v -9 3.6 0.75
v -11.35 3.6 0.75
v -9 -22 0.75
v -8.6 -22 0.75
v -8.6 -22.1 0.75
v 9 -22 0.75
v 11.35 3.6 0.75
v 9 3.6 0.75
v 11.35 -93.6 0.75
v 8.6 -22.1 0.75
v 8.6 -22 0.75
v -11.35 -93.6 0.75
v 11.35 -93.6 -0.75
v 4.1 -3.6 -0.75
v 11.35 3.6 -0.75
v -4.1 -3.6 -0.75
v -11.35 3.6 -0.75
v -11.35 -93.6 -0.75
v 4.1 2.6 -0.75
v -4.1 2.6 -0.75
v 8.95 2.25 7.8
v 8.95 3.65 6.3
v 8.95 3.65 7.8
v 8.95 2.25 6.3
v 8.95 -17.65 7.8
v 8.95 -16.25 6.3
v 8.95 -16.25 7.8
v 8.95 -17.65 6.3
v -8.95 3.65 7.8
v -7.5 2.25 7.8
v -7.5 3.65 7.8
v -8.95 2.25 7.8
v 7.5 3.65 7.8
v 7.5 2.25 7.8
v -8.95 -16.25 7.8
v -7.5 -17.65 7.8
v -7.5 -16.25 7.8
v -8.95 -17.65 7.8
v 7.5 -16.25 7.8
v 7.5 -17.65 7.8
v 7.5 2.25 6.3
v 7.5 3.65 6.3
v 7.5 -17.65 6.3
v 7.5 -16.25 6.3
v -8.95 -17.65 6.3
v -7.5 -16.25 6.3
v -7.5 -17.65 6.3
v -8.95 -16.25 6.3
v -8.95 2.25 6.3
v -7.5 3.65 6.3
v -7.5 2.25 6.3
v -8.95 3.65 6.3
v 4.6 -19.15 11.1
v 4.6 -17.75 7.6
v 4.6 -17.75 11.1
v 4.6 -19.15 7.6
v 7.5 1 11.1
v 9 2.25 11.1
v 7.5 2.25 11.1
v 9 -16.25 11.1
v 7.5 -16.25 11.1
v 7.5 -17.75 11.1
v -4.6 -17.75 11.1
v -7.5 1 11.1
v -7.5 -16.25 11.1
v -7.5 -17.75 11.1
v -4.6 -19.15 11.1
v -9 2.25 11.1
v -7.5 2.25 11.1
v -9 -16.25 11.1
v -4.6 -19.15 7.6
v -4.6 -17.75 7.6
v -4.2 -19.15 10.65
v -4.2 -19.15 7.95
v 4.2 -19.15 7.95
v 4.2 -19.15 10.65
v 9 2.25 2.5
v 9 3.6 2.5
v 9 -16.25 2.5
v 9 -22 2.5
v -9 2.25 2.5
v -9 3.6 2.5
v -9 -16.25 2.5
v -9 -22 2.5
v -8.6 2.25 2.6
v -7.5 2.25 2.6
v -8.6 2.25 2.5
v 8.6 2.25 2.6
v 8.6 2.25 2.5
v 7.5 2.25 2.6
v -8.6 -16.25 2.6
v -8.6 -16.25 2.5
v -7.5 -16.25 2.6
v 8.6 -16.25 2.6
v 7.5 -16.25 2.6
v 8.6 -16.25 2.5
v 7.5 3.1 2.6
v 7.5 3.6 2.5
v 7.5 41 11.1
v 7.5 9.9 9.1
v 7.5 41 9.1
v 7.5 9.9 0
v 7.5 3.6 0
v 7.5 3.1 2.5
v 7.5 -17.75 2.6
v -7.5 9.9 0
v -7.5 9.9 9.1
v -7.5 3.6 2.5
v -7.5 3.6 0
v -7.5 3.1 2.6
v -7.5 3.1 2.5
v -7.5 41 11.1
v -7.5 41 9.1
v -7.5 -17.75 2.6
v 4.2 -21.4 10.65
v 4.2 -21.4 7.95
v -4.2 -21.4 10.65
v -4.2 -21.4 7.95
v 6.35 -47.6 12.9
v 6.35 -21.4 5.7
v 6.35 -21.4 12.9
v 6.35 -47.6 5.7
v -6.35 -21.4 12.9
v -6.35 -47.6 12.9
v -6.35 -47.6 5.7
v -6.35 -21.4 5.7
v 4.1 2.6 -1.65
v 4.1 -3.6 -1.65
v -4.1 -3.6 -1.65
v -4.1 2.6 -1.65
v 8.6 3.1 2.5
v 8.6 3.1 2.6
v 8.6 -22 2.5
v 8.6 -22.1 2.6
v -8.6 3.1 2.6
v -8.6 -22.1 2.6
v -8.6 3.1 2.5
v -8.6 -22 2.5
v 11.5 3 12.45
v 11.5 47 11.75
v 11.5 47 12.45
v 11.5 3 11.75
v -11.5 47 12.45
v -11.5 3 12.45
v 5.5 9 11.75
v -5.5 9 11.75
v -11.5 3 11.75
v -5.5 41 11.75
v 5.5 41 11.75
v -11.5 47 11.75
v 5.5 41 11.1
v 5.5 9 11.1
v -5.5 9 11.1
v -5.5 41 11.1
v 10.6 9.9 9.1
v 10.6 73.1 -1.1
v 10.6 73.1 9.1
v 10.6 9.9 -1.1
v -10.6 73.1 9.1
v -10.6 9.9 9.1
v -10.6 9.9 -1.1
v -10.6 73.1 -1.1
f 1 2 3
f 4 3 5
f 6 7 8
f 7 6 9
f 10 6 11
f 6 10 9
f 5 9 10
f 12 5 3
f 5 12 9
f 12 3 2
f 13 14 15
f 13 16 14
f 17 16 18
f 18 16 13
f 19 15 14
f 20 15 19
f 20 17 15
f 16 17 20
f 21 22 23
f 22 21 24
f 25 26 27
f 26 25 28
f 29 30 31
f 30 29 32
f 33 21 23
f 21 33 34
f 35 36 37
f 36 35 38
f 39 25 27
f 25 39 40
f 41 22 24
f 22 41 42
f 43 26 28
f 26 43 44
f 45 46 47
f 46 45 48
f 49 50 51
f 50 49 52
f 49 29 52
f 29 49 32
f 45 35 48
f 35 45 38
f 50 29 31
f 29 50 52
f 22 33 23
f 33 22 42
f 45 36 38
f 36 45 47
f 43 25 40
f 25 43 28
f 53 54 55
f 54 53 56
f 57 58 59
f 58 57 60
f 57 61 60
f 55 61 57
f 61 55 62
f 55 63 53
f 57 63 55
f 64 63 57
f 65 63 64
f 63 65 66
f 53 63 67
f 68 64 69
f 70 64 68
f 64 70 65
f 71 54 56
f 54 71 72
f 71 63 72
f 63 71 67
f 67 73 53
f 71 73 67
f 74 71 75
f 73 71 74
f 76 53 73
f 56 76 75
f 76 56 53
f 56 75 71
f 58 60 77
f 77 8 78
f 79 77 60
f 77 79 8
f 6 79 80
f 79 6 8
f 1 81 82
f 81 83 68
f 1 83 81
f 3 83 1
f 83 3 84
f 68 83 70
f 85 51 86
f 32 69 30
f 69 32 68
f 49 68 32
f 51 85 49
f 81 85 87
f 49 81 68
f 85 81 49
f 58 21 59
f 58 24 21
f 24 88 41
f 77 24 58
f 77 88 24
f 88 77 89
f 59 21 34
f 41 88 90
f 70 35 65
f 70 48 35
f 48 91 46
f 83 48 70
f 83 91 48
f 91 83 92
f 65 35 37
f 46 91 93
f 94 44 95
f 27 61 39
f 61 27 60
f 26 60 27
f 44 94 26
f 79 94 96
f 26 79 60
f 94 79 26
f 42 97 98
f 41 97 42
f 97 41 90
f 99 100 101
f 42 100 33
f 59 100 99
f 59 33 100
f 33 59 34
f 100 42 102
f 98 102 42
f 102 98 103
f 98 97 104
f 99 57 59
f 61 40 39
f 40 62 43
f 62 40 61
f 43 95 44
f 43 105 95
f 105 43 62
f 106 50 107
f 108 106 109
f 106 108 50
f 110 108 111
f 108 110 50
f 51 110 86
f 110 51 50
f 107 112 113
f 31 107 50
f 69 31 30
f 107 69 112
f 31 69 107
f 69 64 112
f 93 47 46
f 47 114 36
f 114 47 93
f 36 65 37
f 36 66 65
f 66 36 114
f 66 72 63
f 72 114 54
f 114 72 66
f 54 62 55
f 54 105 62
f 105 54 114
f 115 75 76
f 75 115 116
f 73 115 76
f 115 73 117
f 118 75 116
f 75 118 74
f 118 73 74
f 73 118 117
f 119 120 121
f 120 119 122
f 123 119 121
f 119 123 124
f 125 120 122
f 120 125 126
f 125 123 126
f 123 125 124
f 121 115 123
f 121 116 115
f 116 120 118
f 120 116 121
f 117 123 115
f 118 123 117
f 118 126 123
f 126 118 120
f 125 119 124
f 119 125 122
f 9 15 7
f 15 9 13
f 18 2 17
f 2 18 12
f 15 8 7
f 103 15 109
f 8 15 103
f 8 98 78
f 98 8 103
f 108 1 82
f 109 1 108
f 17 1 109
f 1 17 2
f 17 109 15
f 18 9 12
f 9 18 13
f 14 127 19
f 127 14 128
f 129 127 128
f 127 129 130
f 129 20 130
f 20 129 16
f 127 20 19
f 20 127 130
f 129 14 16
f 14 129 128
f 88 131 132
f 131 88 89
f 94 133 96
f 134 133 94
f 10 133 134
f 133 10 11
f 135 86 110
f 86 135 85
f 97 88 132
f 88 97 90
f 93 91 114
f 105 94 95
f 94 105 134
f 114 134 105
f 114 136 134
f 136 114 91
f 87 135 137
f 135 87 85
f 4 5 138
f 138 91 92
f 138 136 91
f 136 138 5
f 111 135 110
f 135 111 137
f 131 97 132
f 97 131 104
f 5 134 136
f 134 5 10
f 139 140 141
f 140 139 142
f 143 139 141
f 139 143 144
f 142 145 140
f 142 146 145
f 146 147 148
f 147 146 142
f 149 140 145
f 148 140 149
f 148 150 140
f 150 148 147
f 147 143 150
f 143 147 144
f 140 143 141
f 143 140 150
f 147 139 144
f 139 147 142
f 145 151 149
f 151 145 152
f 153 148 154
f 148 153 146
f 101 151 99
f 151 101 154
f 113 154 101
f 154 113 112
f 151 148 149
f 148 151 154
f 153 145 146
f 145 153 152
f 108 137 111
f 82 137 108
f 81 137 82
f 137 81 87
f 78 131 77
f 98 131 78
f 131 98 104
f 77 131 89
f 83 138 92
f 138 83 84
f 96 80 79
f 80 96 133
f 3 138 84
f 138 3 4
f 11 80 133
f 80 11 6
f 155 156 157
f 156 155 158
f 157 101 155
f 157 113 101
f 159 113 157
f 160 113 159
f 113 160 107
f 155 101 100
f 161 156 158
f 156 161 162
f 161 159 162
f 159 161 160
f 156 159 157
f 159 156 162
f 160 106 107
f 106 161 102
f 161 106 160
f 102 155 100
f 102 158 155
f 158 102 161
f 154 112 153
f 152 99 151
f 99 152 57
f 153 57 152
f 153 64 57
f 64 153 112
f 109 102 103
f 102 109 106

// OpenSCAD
// file: sensor.scad
use <MCAD/boxes.scad>

//$fn=100;

// large battery 1200mAh : 63
// small battery  600mAh : 38
module battery(length, tol=0) {
    cube([21+tol,length+tol,10+tol],center=true);
}

function inc(arr,tol) = [arr[0]+tol,arr[1]+tol,arr[2]+tol];
function incA(arr,tol) = [arr[0]+tol[0],arr[1]+tol[1],arr[2]+tol[2]];

module esp32(tol=0) {
    pcb=[17.7,21.1,1.3];
    usb=[9,7.3,3.3];
    chip=[13,14,2.1];
    resistors=[17,18,3.6];

    union() {
      // PCB
      cube(inc(pcb, tol), center=true);    
      // USB
      translate([0,-pcb[1]/2+usb[1]/2-1.5,usb[2]/2+pcb[2]/2])
       cube(inc(usb, tol), center=true);    
      // chips
      translate([0,+3.5,chip[2]/2+pcb[2]/2])
       cube(chip, center=true);
      // place for resistors (voltage and battery cables)
      translate([0,0,-resistors[2]/2-pcb[2]/2])
       cube(inc(resistors, tol), center=true);
      // BLE antenna connector
      translate([0,pcb[1]/2,pcb[2]/2+1.5])
       cube(inc([5,5,3], tol), center=true);


    }
}

module antenna(tol=[0,0,0]) {
    union(){        
     cube(incA([22,42,0.5], tol),center=true);
     translate([0,0,-1])        
      cube(incA([10,30,2], tol),center=true);
    }
}

module sensor(tol=0, do_hole=true) {
    pcb=[22.5,97,1.3];
    union() {
      difference() {
        cube(inc(pcb, tol), center=true);    
        if (do_hole) {
          translate([+pcb[0]/2,pcb[1]/2-20.5,0])
            cylinder(6,r=4/2,center=true);
          translate([-pcb[0]/2,pcb[1]/2-20.5,0])
            cylinder(6,r=4/2,center=true);
        }
      }
      // limit line
      translate([0,pcb[1]/2-31,0])
        cube([pcb[0]-8,1,pcb[2]+0.2],center=true);
      // soudures
      translate([0,pcb[1]/2-4,-pcb[2]/2+0.1])
        cube(inc([8,6,2], tol),center=true);
      // chip
      translate([0,pcb[1]/2-13,1.5])
        cube(inc([17,25,2],tol),center=true);
    }
}


module cable(tol=0) {
   translate([0,-4,0])
     cube(inc([8.2,8,2.5],tol),center=true);// usb
   translate([0,-18.9,0])
     cube(inc([12.5,30-4,7],tol),center=true); // plug
}

module model(batt_length, tol=0) {
  translate([0,-45,0])
    sensor(tol);      
  translate([0,25,12.1]) // -> moved 2mm down to adapt esp change below
    antenna([tol,tol,tol]);    
  translate([0,10+batt_length/2,4]) // -> moved 1mm down to keep place for antenna cable
    battery(batt_length,tol);
  translate([0,0,-1]) { // moved 3mm down from v8.0 since space was 9mm (mesured) between PCBs, and min could be 4mm (mesured) -> 9mm-4mm and keep 2mm for security.
    translate([0,-7,8])
      rotate([0,0,0])
        esp32(tol);
    translate([0,-15.6,10.3])
      cable(tol);
  }
}


batS=38;
batL=63;
model(batS);
// main file
use <sensor.scad>

// ================
// holes
// ================
module hole_ESP() {
   translate([0,0,2]) {
    union(){
     translate([0,-7,3.55])// (v8.1) 3mm down
       rotate([0,0,0]) {
        cube([18,18.5,11.1],center=true); // space for cables + esp32
        cube([15,21.5,11.1],center=true); // only keep 
        translate([0,0,1.5])
         esp32(0.2);
       };
      translate([0,-15.6,7.3]) // (v8.1) 3mm down
      cable(0.2);
    }        
  }
}

module hole_model(batt_length) {
  // hole : esp+cable
  hole_ESP();
  // hole : sensor
  translate([0,-45,0])
    sensor(0.2, false);  
  // hole : sensor electronic to align to other holes
  translate([0,-9.2,1.5])
    cube([18,25.6,2],center=true);
  // battery
  translate([0,10+batt_length/2,4]) // -> 1mm down
    battery(batt_length,0.2);    
  // antenna
  translate([0,25,12.1])// (v8.1) ~2mm down
    antenna([1,2,0.2]);        
  // hole : battery-sensor_esp32
  translate([0, 21, 5.55])
    cube([15,40,11.1],center=true);
}

color("#a09090",0.5)
  model(63);
color("#f0a090",0.5)
  hole_model(63);
